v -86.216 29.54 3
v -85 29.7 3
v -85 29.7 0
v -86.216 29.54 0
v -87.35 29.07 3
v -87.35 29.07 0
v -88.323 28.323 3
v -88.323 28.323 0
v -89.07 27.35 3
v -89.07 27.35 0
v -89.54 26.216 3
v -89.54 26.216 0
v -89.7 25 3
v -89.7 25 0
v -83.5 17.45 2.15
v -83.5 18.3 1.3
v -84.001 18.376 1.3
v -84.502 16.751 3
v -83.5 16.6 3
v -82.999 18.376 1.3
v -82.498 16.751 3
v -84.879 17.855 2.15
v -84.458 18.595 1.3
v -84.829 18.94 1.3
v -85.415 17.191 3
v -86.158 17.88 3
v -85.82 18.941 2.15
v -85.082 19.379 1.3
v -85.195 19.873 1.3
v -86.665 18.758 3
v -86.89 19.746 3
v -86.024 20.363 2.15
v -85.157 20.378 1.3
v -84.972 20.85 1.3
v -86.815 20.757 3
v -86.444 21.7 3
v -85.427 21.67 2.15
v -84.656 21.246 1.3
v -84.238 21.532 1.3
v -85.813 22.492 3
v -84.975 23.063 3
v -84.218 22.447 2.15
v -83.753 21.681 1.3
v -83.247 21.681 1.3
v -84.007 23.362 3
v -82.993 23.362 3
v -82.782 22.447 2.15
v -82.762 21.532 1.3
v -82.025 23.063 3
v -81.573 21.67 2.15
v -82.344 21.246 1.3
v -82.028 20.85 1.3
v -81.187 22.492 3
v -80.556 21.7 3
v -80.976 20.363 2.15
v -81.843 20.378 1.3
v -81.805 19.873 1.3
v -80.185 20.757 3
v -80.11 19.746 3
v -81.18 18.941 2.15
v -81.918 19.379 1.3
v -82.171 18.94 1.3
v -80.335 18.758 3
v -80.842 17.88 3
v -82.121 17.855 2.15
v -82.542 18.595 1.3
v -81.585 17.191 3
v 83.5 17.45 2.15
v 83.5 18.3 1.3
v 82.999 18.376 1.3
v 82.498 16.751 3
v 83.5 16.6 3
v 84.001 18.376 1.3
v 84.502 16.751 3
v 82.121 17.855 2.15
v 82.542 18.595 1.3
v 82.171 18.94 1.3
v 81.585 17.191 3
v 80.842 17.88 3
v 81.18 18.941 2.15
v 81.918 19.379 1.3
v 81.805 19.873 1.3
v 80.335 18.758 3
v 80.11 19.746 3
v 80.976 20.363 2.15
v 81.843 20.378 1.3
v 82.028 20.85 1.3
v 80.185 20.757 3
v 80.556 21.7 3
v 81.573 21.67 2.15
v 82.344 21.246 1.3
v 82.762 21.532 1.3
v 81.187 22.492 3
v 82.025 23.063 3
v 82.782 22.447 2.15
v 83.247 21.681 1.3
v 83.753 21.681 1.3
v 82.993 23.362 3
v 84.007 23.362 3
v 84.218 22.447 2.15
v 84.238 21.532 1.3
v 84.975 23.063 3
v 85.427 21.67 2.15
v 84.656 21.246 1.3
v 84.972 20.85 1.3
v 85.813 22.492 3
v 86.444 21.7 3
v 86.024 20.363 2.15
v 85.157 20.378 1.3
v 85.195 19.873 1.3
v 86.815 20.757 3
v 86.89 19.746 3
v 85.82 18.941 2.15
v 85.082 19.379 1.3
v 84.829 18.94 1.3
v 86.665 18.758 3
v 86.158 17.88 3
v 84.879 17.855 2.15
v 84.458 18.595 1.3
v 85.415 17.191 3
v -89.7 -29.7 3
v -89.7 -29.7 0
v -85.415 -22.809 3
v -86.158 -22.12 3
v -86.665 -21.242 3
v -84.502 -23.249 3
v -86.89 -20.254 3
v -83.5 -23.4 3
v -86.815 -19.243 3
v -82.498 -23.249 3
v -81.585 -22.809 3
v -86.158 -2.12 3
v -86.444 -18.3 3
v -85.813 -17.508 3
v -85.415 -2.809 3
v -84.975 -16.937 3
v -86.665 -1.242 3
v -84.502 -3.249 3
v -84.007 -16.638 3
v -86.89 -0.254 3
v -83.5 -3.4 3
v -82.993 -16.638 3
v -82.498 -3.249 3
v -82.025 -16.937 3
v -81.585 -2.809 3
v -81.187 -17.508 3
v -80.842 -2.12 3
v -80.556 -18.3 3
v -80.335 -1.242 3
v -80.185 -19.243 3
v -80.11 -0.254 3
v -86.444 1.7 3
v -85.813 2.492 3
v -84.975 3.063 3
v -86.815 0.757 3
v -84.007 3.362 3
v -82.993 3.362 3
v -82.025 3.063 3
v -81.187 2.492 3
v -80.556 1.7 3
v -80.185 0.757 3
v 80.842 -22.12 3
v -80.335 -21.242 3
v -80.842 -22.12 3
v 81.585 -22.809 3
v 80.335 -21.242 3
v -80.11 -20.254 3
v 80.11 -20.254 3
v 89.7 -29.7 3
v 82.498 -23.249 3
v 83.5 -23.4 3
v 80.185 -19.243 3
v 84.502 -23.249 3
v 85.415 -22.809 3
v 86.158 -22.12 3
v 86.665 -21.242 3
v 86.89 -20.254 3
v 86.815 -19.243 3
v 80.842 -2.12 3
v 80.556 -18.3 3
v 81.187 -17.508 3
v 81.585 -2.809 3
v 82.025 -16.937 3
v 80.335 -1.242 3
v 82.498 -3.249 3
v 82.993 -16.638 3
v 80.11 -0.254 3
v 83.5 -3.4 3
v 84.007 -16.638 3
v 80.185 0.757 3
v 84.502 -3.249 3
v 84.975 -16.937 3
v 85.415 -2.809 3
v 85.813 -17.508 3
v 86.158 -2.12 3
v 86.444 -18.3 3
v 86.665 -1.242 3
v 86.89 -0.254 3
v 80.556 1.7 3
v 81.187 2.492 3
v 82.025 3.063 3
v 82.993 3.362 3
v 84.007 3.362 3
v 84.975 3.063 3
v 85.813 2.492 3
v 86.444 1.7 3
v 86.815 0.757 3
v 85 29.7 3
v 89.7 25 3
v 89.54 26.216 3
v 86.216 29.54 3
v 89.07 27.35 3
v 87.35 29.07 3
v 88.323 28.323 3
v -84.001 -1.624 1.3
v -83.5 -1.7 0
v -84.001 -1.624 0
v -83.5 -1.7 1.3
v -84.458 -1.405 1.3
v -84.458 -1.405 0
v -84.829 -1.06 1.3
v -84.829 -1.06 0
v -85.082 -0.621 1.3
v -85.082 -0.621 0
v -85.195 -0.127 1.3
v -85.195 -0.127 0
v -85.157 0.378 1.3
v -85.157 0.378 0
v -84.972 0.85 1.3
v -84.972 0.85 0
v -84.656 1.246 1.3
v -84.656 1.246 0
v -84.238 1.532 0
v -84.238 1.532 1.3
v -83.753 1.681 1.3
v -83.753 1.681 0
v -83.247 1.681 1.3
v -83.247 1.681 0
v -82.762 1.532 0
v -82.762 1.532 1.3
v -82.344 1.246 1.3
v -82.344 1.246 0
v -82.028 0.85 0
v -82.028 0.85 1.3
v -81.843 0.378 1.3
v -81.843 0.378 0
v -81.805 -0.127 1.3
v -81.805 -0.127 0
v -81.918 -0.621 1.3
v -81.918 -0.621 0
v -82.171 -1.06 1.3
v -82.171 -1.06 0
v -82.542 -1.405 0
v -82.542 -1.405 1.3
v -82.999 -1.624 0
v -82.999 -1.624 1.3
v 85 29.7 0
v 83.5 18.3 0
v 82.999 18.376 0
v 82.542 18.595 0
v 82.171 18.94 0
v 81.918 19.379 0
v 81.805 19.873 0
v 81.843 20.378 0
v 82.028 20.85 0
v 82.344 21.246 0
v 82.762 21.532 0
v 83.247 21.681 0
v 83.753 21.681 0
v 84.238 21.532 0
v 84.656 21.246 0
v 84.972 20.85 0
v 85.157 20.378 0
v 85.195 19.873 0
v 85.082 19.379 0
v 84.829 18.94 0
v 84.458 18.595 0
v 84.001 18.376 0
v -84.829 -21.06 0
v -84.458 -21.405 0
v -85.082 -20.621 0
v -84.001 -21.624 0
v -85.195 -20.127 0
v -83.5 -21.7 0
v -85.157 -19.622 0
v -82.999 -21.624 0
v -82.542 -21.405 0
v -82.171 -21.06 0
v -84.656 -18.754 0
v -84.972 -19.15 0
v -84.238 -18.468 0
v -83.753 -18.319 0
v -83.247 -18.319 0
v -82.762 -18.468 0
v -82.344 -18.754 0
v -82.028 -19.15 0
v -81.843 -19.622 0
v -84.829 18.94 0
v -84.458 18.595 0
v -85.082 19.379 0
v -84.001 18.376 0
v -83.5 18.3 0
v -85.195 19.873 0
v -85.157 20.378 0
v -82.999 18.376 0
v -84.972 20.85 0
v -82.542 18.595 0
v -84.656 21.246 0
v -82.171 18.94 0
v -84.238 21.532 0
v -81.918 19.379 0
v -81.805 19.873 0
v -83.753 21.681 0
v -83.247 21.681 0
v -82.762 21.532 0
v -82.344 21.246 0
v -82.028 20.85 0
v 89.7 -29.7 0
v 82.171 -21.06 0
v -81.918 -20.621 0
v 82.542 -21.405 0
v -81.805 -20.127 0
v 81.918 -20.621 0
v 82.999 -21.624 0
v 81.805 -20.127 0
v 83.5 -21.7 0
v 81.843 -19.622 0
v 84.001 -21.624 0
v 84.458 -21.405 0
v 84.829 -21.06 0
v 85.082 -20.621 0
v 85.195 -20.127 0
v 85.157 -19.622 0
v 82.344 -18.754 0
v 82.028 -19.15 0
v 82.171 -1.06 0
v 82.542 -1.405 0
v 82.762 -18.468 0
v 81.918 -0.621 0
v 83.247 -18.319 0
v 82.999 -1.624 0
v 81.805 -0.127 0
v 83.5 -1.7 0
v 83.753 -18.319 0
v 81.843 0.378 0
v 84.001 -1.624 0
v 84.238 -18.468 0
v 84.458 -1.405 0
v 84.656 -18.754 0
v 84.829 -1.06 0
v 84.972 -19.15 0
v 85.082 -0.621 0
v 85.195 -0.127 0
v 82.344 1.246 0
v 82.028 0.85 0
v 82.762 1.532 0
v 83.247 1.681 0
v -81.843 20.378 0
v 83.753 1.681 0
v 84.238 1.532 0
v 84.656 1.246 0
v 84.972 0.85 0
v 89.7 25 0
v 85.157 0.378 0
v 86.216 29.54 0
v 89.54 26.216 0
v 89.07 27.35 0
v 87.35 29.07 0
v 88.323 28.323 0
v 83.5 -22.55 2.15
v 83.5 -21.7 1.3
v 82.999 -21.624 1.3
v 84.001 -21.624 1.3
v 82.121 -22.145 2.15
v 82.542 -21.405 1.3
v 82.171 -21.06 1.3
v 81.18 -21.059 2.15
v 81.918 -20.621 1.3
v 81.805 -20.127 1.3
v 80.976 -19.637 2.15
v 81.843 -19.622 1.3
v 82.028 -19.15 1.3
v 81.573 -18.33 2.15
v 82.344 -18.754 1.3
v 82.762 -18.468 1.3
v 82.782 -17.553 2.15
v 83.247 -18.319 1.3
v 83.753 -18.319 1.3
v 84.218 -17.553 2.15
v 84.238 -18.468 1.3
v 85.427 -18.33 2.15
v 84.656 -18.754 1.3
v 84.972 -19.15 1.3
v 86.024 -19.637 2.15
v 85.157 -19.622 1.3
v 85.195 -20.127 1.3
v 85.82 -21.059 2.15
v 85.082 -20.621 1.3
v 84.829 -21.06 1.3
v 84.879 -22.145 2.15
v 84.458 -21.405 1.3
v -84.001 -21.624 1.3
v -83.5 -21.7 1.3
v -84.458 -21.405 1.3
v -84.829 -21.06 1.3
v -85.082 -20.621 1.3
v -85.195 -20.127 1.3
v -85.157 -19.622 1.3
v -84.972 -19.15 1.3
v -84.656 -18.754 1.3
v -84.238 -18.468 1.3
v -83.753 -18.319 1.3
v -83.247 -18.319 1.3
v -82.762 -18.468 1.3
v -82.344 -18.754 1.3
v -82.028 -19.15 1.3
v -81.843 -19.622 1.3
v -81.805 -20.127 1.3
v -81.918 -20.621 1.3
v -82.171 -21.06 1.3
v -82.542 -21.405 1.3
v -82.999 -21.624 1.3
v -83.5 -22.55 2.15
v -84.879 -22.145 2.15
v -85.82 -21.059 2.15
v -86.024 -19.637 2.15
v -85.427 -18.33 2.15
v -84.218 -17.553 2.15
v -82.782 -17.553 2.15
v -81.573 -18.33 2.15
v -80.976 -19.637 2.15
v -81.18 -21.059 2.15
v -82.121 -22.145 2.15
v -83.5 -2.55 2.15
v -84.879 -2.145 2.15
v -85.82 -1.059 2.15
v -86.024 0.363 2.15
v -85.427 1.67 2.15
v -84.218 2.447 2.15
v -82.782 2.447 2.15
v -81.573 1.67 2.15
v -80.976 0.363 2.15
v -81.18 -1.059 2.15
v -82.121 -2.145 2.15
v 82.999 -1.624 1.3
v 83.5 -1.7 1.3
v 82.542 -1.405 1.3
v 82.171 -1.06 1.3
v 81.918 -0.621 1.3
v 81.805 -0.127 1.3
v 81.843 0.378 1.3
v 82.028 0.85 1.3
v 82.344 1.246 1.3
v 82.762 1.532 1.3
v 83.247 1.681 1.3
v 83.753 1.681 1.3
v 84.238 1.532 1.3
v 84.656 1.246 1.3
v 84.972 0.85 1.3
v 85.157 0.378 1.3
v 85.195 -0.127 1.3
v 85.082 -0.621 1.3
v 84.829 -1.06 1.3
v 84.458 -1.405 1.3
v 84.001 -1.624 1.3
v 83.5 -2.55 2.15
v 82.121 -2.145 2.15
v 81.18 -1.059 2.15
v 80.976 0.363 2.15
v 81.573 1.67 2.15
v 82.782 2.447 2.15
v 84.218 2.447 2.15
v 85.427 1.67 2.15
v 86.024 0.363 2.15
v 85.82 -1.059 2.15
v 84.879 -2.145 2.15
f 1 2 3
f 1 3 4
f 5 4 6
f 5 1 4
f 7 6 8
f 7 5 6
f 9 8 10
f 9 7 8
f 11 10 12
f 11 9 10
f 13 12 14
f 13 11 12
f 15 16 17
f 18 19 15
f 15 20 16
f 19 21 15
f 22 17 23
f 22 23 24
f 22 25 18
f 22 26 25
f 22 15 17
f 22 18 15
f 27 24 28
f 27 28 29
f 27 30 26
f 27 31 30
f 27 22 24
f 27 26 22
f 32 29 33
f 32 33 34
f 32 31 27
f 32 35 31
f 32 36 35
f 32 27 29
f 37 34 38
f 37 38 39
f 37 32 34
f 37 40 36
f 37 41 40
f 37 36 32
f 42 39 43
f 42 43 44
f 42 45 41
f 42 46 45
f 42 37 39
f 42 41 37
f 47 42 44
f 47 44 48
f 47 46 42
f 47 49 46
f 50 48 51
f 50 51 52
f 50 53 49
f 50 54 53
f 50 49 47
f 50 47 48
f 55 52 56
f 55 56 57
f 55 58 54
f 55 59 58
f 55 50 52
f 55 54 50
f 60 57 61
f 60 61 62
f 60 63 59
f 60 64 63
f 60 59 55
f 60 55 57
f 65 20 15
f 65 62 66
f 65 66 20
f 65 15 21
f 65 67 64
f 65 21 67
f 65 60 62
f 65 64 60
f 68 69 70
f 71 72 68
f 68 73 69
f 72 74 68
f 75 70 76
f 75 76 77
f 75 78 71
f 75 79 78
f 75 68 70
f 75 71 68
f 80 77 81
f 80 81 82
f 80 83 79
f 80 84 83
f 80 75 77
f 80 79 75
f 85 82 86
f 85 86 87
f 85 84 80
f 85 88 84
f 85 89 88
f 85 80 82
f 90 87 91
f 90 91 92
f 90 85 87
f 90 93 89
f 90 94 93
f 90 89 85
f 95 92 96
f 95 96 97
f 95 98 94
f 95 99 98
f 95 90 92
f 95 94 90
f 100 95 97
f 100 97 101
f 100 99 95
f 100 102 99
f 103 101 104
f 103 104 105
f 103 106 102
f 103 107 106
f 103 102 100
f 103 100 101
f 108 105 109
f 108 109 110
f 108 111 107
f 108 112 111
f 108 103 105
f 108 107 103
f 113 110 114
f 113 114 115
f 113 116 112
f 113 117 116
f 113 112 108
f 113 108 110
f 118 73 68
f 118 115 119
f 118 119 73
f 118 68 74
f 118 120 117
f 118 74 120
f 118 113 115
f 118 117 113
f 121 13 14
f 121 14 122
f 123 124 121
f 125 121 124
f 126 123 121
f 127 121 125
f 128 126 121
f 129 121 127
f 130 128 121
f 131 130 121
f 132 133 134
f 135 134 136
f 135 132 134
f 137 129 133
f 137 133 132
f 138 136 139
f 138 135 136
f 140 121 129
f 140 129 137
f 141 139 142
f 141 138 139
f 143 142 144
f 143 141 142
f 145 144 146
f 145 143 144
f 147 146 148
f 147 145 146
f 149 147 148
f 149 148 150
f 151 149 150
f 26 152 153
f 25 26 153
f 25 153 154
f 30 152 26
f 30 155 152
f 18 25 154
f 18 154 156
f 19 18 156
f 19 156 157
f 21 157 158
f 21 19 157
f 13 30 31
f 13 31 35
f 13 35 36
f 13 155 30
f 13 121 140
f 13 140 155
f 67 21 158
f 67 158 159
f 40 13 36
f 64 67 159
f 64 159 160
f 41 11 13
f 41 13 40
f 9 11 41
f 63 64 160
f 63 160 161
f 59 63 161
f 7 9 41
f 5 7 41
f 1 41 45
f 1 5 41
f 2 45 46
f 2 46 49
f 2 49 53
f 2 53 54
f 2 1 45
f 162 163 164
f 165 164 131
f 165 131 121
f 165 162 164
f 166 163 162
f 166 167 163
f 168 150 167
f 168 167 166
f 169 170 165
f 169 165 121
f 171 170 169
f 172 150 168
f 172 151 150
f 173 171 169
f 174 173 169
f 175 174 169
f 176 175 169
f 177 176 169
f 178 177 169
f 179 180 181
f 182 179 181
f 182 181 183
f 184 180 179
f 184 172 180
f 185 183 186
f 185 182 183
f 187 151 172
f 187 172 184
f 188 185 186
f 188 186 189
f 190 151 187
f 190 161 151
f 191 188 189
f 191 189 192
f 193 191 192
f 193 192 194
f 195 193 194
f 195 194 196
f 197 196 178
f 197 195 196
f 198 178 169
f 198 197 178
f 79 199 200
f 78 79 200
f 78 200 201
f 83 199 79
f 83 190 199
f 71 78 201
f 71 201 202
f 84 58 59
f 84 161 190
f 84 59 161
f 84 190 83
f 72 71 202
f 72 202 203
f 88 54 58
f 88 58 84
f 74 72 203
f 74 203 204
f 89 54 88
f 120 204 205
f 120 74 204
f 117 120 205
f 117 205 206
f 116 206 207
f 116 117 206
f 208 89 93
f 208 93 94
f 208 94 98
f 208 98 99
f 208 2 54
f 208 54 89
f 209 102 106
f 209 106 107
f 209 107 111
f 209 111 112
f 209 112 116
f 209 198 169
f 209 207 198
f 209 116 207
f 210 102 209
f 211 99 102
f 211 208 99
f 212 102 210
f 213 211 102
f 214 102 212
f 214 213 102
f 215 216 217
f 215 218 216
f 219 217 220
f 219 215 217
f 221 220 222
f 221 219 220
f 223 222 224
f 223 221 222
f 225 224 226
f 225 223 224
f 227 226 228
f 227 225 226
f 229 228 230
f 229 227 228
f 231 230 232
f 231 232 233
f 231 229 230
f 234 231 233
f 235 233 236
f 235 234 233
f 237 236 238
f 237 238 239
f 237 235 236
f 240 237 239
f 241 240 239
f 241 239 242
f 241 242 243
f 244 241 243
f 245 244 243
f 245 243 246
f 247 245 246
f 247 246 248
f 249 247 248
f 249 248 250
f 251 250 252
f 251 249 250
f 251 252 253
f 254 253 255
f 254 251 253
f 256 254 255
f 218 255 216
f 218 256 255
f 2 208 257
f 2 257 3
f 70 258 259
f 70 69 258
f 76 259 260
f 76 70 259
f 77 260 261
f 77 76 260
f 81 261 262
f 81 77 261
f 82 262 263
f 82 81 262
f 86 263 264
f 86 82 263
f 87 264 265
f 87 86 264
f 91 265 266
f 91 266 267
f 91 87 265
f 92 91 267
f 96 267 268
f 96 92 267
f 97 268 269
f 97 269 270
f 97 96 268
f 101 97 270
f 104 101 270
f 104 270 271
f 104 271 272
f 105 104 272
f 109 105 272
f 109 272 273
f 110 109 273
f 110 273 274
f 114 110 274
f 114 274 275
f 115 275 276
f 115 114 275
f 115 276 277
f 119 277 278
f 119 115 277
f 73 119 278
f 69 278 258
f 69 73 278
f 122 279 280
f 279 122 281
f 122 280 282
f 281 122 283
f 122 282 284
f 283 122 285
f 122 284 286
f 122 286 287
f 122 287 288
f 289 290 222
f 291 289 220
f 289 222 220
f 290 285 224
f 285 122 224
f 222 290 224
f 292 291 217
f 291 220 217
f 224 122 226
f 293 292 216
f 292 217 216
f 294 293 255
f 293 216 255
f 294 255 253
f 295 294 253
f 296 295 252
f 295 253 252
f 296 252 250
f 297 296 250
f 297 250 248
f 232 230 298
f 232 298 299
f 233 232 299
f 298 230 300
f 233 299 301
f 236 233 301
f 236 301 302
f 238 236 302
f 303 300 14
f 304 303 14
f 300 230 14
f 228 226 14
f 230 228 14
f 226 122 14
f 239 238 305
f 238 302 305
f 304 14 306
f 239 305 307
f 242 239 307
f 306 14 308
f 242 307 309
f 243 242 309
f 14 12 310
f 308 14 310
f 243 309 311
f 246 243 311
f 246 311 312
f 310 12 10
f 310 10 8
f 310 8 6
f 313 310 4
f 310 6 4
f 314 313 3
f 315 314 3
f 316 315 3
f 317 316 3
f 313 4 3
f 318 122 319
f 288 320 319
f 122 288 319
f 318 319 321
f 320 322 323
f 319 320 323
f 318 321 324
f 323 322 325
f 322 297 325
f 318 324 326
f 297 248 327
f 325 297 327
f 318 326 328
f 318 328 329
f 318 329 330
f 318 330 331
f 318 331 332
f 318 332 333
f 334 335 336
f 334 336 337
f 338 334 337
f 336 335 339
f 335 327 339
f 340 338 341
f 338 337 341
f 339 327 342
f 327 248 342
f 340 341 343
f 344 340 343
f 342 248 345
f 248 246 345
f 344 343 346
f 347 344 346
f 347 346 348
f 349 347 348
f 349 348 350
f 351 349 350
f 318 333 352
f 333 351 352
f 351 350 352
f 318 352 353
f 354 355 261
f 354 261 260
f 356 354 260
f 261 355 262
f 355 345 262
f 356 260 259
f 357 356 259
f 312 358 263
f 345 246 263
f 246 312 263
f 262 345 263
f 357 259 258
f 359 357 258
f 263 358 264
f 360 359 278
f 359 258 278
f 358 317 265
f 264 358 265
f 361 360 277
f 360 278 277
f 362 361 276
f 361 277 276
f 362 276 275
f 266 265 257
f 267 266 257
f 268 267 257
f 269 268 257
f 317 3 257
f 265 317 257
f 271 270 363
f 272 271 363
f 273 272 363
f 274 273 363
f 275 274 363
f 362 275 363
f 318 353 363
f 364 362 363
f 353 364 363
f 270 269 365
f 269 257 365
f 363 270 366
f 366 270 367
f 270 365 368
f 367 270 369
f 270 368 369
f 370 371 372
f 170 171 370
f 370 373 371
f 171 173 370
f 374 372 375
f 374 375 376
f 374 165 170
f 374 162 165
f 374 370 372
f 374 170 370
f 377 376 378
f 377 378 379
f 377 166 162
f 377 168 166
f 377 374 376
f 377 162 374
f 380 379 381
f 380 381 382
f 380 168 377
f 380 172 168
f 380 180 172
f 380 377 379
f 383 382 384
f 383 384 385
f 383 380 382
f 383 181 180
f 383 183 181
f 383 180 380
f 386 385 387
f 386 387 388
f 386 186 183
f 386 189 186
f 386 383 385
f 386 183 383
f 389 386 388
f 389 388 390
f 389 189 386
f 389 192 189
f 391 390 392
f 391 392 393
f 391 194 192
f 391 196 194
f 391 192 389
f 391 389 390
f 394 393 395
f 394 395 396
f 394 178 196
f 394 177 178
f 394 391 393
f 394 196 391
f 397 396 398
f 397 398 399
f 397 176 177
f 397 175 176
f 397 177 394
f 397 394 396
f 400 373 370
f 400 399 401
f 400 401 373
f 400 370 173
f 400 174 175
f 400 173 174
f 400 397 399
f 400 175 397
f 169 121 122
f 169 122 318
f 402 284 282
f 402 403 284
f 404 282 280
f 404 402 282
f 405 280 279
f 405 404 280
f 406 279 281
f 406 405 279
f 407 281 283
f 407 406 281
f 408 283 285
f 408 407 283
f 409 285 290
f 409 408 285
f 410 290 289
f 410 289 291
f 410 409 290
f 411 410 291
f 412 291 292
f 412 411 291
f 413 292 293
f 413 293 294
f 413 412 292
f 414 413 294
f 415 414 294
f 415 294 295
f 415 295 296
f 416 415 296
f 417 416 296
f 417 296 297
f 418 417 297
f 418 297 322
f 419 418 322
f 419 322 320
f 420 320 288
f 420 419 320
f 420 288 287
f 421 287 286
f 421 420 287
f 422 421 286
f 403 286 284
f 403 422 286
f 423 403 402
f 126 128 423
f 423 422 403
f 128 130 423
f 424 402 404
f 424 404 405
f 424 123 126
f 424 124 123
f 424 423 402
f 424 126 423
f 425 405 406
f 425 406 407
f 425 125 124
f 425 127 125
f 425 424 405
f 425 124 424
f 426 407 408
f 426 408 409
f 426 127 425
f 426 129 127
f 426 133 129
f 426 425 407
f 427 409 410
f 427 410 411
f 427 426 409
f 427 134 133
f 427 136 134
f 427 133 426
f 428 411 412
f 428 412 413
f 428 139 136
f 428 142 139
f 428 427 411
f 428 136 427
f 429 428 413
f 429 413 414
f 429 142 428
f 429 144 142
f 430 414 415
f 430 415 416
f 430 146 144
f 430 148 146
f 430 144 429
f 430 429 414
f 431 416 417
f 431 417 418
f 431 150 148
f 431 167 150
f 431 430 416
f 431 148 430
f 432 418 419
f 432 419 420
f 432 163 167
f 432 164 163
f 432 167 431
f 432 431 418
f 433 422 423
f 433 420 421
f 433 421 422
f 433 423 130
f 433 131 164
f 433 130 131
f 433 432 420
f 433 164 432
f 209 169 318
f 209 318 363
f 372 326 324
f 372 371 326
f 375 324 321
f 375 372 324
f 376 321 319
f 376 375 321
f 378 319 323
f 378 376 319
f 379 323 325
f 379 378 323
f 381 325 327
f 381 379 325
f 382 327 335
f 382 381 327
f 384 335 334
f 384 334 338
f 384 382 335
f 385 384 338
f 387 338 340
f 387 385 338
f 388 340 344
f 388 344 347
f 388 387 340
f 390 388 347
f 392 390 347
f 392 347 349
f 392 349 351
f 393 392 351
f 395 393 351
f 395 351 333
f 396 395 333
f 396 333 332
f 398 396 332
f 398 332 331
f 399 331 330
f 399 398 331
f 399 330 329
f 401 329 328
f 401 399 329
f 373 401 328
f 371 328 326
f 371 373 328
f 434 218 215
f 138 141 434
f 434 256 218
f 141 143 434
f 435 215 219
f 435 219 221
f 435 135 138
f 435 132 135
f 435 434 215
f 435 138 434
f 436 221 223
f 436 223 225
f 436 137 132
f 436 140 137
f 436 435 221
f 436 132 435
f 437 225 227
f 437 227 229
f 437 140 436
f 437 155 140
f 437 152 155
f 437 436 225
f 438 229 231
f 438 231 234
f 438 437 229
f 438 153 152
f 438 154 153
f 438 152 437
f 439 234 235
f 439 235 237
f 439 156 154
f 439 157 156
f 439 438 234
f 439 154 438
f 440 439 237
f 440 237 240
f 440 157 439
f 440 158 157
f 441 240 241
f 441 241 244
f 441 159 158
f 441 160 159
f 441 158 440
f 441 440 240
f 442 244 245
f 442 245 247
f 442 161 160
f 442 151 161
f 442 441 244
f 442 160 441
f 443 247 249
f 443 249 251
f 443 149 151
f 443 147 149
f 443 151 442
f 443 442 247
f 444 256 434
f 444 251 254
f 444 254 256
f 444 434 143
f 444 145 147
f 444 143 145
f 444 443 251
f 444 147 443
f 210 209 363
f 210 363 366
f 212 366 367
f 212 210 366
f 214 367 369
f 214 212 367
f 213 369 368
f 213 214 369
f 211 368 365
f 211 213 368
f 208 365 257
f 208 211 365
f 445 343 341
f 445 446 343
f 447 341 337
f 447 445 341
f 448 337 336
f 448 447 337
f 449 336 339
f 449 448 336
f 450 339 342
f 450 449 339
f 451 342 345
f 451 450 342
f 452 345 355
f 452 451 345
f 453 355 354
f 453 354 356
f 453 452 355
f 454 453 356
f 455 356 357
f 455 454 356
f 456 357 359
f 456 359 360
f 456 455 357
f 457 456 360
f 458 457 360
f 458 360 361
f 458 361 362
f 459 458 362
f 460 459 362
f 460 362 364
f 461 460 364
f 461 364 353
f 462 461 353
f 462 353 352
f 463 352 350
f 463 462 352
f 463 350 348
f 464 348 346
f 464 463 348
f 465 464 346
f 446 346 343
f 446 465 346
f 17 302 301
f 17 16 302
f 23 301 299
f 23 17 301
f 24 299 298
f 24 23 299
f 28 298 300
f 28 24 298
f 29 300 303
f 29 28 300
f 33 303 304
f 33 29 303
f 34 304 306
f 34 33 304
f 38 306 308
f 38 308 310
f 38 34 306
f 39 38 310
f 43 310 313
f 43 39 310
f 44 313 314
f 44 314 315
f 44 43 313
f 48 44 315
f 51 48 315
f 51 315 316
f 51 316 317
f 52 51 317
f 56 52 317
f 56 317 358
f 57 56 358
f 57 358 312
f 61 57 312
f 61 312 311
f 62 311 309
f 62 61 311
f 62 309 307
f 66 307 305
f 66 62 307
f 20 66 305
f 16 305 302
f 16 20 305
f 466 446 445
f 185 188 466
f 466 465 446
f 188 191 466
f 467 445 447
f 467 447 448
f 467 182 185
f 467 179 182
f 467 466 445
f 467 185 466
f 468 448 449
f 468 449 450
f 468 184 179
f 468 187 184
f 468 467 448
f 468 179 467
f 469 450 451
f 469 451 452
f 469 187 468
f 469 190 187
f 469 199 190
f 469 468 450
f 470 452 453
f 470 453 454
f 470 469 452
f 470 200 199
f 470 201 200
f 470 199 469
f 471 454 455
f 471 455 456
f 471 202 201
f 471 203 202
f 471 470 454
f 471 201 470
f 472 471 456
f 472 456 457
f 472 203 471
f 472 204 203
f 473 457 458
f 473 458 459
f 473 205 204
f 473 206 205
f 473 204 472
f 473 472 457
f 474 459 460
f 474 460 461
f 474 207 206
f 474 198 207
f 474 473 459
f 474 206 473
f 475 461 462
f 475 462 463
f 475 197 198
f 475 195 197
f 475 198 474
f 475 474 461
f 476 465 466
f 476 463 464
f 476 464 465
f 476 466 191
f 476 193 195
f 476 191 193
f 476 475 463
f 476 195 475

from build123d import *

# Parameters (mm, degrees)
SKETCH1_W                                      = 180
SKETCH1_H                                      = 60
BOSS_EXTRUDE1_DEPTH                            = 3
FILLET1_R                                      = 5
CSK_FOR_M3_FLAT_HEAD_MACHINE_SCREW1_AT_2_COUNT = 2
CSK_FOR_M3_FLAT_HEAD_MACHINE_SCREW1_AT_2_PITCH = 20
CSK_FOR_M3_FLAT_HEAD_MACHINE_SCREW1_AT_3_COUNT = 2
CSK_FOR_M3_FLAT_HEAD_MACHINE_SCREW1_AT_3_PITCH = 40
CSK_FOR_M3_FLAT_HEAD_MACHINE_SCREW1_AT_4_COUNT = 2
CSK_FOR_M3_FLAT_HEAD_MACHINE_SCREW1_AT_4_PITCH = 167
CSK_FOR_M3_FLAT_HEAD_MACHINE_SCREW1_AT_5_COUNT = 2
CSK_FOR_M3_FLAT_HEAD_MACHINE_SCREW1_AT_5_PITCH = 168.193341129
CSK_FOR_M3_FLAT_HEAD_MACHINE_SCREW1_AT_6_COUNT = 2
CSK_FOR_M3_FLAT_HEAD_MACHINE_SCREW1_AT_6_PITCH = 171.723615149
CUT_EXTRUDE1_REACH                             = 96.916


with BuildPart() as part:
    # Sketch1 → Boss-Extrude1 (new body)
    with BuildSketch(Plane.XY):
        Rectangle(SKETCH1_W, SKETCH1_H)
    extrude(amount=BOSS_EXTRUDE1_DEPTH)

    # Fillet1
    fillet1_edges = [part.edges().sort_by_distance(p)[0] for p in [
        (-90, 30, 1.5),
        (90, 30, 1.5),
    ]]
    fillet(fillet1_edges, radius=FILLET1_R)

    # Sketch3 → CSK for M3 Flat Head Machine Screw1 (revolve, cut)
    with BuildSketch(Plane(origin=(-83.5, 20, 3), x_dir=(0, -1, 0), z_dir=(1, 0, 0))):
        Polygon((0, 0), (0, 3), (1.7, 3), (1.7, 1.7), (3.4, 0), align=None)
    csk_for_m3_flat_head_machine_screw1 = revolve(axis=Axis((-83.5, 20, 9.35), (0, 0, -1)), mode=Mode.SUBTRACT)

    # CSK for M3 Flat Head Machine Screw1 at 2: CSK for M3 Flat Head Machine Screw1 ×2
    with Locations(*[(0, -i * CSK_FOR_M3_FLAT_HEAD_MACHINE_SCREW1_AT_2_PITCH, 0) for i in range(1, CSK_FOR_M3_FLAT_HEAD_MACHINE_SCREW1_AT_2_COUNT)]):
        add(csk_for_m3_flat_head_machine_screw1, mode=Mode.SUBTRACT)

    # CSK for M3 Flat Head Machine Screw1 at 3: CSK for M3 Flat Head Machine Screw1 ×2
    with Locations(*[(0, -i * CSK_FOR_M3_FLAT_HEAD_MACHINE_SCREW1_AT_3_PITCH, 0) for i in range(1, CSK_FOR_M3_FLAT_HEAD_MACHINE_SCREW1_AT_3_COUNT)]):
        add(csk_for_m3_flat_head_machine_screw1, mode=Mode.SUBTRACT)

    # CSK for M3 Flat Head Machine Screw1 at 4: CSK for M3 Flat Head Machine Screw1 ×2
    with Locations(*[(i * CSK_FOR_M3_FLAT_HEAD_MACHINE_SCREW1_AT_4_PITCH, 0, 0) for i in range(1, CSK_FOR_M3_FLAT_HEAD_MACHINE_SCREW1_AT_4_COUNT)]):
        add(csk_for_m3_flat_head_machine_screw1, mode=Mode.SUBTRACT)

    # CSK for M3 Flat Head Machine Screw1 at 5: CSK for M3 Flat Head Machine Screw1 ×2
    with Locations(*[Vector(0.9929049442707555, -0.11891077176895277, 0) * (i * CSK_FOR_M3_FLAT_HEAD_MACHINE_SCREW1_AT_5_PITCH) for i in range(1, CSK_FOR_M3_FLAT_HEAD_MACHINE_SCREW1_AT_5_COUNT)]):
        add(csk_for_m3_flat_head_machine_screw1, mode=Mode.SUBTRACT)

    # CSK for M3 Flat Head Machine Screw1 at 6: CSK for M3 Flat Head Machine Screw1 ×2
    with Locations(*[Vector(0.9724929204096406, -0.2329324360262613, 0) * (i * CSK_FOR_M3_FLAT_HEAD_MACHINE_SCREW1_AT_6_PITCH) for i in range(1, CSK_FOR_M3_FLAT_HEAD_MACHINE_SCREW1_AT_6_COUNT)]):
        add(csk_for_m3_flat_head_machine_screw1, mode=Mode.SUBTRACT)

    # Sketch4 → Cut-Extrude1 (cut, up to next)
    with BuildSketch(Plane.XY.offset(3), mode=Mode.PRIVATE) as cut_extrude1_sk1:
        with BuildLine():
            Line((85, 30), (-85, 30))
            ThreePointArc((-85, 30), (-88.535533906, 28.535533906), (-90, 25))
            Line((-90, 25), (-90, -30))
            Line((-90, -30), (90, -30))
            Line((90, -30), (90, 25))
            ThreePointArc((90, 25), (88.535533906, 28.535533906), (85, 30))
        make_face()
        with BuildLine():
            Line((85, 29.7), (-85, 29.7))
            ThreePointArc((-85, 29.7), (-88.323401872, 28.323401872), (-89.7, 25))
            Line((-89.7, 25), (-89.7, -29.7))
            Line((-89.7, -29.7), (89.7, -29.7))
            Line((89.7, -29.7), (89.7, 25))
            ThreePointArc((89.7, 25), (88.323401872, 28.323401872), (85, 29.7))
        make_face(mode=Mode.SUBTRACT)
    cut_extrude1_tool1 = extrude(cut_extrude1_sk1.sketch, amount=-CUT_EXTRUDE1_REACH, mode=Mode.PRIVATE) & part.part
    add(cut_extrude1_tool1.solids().sort_by_distance((0, 29.810263, 3))[0], mode=Mode.SUBTRACT)


solid = part.part
